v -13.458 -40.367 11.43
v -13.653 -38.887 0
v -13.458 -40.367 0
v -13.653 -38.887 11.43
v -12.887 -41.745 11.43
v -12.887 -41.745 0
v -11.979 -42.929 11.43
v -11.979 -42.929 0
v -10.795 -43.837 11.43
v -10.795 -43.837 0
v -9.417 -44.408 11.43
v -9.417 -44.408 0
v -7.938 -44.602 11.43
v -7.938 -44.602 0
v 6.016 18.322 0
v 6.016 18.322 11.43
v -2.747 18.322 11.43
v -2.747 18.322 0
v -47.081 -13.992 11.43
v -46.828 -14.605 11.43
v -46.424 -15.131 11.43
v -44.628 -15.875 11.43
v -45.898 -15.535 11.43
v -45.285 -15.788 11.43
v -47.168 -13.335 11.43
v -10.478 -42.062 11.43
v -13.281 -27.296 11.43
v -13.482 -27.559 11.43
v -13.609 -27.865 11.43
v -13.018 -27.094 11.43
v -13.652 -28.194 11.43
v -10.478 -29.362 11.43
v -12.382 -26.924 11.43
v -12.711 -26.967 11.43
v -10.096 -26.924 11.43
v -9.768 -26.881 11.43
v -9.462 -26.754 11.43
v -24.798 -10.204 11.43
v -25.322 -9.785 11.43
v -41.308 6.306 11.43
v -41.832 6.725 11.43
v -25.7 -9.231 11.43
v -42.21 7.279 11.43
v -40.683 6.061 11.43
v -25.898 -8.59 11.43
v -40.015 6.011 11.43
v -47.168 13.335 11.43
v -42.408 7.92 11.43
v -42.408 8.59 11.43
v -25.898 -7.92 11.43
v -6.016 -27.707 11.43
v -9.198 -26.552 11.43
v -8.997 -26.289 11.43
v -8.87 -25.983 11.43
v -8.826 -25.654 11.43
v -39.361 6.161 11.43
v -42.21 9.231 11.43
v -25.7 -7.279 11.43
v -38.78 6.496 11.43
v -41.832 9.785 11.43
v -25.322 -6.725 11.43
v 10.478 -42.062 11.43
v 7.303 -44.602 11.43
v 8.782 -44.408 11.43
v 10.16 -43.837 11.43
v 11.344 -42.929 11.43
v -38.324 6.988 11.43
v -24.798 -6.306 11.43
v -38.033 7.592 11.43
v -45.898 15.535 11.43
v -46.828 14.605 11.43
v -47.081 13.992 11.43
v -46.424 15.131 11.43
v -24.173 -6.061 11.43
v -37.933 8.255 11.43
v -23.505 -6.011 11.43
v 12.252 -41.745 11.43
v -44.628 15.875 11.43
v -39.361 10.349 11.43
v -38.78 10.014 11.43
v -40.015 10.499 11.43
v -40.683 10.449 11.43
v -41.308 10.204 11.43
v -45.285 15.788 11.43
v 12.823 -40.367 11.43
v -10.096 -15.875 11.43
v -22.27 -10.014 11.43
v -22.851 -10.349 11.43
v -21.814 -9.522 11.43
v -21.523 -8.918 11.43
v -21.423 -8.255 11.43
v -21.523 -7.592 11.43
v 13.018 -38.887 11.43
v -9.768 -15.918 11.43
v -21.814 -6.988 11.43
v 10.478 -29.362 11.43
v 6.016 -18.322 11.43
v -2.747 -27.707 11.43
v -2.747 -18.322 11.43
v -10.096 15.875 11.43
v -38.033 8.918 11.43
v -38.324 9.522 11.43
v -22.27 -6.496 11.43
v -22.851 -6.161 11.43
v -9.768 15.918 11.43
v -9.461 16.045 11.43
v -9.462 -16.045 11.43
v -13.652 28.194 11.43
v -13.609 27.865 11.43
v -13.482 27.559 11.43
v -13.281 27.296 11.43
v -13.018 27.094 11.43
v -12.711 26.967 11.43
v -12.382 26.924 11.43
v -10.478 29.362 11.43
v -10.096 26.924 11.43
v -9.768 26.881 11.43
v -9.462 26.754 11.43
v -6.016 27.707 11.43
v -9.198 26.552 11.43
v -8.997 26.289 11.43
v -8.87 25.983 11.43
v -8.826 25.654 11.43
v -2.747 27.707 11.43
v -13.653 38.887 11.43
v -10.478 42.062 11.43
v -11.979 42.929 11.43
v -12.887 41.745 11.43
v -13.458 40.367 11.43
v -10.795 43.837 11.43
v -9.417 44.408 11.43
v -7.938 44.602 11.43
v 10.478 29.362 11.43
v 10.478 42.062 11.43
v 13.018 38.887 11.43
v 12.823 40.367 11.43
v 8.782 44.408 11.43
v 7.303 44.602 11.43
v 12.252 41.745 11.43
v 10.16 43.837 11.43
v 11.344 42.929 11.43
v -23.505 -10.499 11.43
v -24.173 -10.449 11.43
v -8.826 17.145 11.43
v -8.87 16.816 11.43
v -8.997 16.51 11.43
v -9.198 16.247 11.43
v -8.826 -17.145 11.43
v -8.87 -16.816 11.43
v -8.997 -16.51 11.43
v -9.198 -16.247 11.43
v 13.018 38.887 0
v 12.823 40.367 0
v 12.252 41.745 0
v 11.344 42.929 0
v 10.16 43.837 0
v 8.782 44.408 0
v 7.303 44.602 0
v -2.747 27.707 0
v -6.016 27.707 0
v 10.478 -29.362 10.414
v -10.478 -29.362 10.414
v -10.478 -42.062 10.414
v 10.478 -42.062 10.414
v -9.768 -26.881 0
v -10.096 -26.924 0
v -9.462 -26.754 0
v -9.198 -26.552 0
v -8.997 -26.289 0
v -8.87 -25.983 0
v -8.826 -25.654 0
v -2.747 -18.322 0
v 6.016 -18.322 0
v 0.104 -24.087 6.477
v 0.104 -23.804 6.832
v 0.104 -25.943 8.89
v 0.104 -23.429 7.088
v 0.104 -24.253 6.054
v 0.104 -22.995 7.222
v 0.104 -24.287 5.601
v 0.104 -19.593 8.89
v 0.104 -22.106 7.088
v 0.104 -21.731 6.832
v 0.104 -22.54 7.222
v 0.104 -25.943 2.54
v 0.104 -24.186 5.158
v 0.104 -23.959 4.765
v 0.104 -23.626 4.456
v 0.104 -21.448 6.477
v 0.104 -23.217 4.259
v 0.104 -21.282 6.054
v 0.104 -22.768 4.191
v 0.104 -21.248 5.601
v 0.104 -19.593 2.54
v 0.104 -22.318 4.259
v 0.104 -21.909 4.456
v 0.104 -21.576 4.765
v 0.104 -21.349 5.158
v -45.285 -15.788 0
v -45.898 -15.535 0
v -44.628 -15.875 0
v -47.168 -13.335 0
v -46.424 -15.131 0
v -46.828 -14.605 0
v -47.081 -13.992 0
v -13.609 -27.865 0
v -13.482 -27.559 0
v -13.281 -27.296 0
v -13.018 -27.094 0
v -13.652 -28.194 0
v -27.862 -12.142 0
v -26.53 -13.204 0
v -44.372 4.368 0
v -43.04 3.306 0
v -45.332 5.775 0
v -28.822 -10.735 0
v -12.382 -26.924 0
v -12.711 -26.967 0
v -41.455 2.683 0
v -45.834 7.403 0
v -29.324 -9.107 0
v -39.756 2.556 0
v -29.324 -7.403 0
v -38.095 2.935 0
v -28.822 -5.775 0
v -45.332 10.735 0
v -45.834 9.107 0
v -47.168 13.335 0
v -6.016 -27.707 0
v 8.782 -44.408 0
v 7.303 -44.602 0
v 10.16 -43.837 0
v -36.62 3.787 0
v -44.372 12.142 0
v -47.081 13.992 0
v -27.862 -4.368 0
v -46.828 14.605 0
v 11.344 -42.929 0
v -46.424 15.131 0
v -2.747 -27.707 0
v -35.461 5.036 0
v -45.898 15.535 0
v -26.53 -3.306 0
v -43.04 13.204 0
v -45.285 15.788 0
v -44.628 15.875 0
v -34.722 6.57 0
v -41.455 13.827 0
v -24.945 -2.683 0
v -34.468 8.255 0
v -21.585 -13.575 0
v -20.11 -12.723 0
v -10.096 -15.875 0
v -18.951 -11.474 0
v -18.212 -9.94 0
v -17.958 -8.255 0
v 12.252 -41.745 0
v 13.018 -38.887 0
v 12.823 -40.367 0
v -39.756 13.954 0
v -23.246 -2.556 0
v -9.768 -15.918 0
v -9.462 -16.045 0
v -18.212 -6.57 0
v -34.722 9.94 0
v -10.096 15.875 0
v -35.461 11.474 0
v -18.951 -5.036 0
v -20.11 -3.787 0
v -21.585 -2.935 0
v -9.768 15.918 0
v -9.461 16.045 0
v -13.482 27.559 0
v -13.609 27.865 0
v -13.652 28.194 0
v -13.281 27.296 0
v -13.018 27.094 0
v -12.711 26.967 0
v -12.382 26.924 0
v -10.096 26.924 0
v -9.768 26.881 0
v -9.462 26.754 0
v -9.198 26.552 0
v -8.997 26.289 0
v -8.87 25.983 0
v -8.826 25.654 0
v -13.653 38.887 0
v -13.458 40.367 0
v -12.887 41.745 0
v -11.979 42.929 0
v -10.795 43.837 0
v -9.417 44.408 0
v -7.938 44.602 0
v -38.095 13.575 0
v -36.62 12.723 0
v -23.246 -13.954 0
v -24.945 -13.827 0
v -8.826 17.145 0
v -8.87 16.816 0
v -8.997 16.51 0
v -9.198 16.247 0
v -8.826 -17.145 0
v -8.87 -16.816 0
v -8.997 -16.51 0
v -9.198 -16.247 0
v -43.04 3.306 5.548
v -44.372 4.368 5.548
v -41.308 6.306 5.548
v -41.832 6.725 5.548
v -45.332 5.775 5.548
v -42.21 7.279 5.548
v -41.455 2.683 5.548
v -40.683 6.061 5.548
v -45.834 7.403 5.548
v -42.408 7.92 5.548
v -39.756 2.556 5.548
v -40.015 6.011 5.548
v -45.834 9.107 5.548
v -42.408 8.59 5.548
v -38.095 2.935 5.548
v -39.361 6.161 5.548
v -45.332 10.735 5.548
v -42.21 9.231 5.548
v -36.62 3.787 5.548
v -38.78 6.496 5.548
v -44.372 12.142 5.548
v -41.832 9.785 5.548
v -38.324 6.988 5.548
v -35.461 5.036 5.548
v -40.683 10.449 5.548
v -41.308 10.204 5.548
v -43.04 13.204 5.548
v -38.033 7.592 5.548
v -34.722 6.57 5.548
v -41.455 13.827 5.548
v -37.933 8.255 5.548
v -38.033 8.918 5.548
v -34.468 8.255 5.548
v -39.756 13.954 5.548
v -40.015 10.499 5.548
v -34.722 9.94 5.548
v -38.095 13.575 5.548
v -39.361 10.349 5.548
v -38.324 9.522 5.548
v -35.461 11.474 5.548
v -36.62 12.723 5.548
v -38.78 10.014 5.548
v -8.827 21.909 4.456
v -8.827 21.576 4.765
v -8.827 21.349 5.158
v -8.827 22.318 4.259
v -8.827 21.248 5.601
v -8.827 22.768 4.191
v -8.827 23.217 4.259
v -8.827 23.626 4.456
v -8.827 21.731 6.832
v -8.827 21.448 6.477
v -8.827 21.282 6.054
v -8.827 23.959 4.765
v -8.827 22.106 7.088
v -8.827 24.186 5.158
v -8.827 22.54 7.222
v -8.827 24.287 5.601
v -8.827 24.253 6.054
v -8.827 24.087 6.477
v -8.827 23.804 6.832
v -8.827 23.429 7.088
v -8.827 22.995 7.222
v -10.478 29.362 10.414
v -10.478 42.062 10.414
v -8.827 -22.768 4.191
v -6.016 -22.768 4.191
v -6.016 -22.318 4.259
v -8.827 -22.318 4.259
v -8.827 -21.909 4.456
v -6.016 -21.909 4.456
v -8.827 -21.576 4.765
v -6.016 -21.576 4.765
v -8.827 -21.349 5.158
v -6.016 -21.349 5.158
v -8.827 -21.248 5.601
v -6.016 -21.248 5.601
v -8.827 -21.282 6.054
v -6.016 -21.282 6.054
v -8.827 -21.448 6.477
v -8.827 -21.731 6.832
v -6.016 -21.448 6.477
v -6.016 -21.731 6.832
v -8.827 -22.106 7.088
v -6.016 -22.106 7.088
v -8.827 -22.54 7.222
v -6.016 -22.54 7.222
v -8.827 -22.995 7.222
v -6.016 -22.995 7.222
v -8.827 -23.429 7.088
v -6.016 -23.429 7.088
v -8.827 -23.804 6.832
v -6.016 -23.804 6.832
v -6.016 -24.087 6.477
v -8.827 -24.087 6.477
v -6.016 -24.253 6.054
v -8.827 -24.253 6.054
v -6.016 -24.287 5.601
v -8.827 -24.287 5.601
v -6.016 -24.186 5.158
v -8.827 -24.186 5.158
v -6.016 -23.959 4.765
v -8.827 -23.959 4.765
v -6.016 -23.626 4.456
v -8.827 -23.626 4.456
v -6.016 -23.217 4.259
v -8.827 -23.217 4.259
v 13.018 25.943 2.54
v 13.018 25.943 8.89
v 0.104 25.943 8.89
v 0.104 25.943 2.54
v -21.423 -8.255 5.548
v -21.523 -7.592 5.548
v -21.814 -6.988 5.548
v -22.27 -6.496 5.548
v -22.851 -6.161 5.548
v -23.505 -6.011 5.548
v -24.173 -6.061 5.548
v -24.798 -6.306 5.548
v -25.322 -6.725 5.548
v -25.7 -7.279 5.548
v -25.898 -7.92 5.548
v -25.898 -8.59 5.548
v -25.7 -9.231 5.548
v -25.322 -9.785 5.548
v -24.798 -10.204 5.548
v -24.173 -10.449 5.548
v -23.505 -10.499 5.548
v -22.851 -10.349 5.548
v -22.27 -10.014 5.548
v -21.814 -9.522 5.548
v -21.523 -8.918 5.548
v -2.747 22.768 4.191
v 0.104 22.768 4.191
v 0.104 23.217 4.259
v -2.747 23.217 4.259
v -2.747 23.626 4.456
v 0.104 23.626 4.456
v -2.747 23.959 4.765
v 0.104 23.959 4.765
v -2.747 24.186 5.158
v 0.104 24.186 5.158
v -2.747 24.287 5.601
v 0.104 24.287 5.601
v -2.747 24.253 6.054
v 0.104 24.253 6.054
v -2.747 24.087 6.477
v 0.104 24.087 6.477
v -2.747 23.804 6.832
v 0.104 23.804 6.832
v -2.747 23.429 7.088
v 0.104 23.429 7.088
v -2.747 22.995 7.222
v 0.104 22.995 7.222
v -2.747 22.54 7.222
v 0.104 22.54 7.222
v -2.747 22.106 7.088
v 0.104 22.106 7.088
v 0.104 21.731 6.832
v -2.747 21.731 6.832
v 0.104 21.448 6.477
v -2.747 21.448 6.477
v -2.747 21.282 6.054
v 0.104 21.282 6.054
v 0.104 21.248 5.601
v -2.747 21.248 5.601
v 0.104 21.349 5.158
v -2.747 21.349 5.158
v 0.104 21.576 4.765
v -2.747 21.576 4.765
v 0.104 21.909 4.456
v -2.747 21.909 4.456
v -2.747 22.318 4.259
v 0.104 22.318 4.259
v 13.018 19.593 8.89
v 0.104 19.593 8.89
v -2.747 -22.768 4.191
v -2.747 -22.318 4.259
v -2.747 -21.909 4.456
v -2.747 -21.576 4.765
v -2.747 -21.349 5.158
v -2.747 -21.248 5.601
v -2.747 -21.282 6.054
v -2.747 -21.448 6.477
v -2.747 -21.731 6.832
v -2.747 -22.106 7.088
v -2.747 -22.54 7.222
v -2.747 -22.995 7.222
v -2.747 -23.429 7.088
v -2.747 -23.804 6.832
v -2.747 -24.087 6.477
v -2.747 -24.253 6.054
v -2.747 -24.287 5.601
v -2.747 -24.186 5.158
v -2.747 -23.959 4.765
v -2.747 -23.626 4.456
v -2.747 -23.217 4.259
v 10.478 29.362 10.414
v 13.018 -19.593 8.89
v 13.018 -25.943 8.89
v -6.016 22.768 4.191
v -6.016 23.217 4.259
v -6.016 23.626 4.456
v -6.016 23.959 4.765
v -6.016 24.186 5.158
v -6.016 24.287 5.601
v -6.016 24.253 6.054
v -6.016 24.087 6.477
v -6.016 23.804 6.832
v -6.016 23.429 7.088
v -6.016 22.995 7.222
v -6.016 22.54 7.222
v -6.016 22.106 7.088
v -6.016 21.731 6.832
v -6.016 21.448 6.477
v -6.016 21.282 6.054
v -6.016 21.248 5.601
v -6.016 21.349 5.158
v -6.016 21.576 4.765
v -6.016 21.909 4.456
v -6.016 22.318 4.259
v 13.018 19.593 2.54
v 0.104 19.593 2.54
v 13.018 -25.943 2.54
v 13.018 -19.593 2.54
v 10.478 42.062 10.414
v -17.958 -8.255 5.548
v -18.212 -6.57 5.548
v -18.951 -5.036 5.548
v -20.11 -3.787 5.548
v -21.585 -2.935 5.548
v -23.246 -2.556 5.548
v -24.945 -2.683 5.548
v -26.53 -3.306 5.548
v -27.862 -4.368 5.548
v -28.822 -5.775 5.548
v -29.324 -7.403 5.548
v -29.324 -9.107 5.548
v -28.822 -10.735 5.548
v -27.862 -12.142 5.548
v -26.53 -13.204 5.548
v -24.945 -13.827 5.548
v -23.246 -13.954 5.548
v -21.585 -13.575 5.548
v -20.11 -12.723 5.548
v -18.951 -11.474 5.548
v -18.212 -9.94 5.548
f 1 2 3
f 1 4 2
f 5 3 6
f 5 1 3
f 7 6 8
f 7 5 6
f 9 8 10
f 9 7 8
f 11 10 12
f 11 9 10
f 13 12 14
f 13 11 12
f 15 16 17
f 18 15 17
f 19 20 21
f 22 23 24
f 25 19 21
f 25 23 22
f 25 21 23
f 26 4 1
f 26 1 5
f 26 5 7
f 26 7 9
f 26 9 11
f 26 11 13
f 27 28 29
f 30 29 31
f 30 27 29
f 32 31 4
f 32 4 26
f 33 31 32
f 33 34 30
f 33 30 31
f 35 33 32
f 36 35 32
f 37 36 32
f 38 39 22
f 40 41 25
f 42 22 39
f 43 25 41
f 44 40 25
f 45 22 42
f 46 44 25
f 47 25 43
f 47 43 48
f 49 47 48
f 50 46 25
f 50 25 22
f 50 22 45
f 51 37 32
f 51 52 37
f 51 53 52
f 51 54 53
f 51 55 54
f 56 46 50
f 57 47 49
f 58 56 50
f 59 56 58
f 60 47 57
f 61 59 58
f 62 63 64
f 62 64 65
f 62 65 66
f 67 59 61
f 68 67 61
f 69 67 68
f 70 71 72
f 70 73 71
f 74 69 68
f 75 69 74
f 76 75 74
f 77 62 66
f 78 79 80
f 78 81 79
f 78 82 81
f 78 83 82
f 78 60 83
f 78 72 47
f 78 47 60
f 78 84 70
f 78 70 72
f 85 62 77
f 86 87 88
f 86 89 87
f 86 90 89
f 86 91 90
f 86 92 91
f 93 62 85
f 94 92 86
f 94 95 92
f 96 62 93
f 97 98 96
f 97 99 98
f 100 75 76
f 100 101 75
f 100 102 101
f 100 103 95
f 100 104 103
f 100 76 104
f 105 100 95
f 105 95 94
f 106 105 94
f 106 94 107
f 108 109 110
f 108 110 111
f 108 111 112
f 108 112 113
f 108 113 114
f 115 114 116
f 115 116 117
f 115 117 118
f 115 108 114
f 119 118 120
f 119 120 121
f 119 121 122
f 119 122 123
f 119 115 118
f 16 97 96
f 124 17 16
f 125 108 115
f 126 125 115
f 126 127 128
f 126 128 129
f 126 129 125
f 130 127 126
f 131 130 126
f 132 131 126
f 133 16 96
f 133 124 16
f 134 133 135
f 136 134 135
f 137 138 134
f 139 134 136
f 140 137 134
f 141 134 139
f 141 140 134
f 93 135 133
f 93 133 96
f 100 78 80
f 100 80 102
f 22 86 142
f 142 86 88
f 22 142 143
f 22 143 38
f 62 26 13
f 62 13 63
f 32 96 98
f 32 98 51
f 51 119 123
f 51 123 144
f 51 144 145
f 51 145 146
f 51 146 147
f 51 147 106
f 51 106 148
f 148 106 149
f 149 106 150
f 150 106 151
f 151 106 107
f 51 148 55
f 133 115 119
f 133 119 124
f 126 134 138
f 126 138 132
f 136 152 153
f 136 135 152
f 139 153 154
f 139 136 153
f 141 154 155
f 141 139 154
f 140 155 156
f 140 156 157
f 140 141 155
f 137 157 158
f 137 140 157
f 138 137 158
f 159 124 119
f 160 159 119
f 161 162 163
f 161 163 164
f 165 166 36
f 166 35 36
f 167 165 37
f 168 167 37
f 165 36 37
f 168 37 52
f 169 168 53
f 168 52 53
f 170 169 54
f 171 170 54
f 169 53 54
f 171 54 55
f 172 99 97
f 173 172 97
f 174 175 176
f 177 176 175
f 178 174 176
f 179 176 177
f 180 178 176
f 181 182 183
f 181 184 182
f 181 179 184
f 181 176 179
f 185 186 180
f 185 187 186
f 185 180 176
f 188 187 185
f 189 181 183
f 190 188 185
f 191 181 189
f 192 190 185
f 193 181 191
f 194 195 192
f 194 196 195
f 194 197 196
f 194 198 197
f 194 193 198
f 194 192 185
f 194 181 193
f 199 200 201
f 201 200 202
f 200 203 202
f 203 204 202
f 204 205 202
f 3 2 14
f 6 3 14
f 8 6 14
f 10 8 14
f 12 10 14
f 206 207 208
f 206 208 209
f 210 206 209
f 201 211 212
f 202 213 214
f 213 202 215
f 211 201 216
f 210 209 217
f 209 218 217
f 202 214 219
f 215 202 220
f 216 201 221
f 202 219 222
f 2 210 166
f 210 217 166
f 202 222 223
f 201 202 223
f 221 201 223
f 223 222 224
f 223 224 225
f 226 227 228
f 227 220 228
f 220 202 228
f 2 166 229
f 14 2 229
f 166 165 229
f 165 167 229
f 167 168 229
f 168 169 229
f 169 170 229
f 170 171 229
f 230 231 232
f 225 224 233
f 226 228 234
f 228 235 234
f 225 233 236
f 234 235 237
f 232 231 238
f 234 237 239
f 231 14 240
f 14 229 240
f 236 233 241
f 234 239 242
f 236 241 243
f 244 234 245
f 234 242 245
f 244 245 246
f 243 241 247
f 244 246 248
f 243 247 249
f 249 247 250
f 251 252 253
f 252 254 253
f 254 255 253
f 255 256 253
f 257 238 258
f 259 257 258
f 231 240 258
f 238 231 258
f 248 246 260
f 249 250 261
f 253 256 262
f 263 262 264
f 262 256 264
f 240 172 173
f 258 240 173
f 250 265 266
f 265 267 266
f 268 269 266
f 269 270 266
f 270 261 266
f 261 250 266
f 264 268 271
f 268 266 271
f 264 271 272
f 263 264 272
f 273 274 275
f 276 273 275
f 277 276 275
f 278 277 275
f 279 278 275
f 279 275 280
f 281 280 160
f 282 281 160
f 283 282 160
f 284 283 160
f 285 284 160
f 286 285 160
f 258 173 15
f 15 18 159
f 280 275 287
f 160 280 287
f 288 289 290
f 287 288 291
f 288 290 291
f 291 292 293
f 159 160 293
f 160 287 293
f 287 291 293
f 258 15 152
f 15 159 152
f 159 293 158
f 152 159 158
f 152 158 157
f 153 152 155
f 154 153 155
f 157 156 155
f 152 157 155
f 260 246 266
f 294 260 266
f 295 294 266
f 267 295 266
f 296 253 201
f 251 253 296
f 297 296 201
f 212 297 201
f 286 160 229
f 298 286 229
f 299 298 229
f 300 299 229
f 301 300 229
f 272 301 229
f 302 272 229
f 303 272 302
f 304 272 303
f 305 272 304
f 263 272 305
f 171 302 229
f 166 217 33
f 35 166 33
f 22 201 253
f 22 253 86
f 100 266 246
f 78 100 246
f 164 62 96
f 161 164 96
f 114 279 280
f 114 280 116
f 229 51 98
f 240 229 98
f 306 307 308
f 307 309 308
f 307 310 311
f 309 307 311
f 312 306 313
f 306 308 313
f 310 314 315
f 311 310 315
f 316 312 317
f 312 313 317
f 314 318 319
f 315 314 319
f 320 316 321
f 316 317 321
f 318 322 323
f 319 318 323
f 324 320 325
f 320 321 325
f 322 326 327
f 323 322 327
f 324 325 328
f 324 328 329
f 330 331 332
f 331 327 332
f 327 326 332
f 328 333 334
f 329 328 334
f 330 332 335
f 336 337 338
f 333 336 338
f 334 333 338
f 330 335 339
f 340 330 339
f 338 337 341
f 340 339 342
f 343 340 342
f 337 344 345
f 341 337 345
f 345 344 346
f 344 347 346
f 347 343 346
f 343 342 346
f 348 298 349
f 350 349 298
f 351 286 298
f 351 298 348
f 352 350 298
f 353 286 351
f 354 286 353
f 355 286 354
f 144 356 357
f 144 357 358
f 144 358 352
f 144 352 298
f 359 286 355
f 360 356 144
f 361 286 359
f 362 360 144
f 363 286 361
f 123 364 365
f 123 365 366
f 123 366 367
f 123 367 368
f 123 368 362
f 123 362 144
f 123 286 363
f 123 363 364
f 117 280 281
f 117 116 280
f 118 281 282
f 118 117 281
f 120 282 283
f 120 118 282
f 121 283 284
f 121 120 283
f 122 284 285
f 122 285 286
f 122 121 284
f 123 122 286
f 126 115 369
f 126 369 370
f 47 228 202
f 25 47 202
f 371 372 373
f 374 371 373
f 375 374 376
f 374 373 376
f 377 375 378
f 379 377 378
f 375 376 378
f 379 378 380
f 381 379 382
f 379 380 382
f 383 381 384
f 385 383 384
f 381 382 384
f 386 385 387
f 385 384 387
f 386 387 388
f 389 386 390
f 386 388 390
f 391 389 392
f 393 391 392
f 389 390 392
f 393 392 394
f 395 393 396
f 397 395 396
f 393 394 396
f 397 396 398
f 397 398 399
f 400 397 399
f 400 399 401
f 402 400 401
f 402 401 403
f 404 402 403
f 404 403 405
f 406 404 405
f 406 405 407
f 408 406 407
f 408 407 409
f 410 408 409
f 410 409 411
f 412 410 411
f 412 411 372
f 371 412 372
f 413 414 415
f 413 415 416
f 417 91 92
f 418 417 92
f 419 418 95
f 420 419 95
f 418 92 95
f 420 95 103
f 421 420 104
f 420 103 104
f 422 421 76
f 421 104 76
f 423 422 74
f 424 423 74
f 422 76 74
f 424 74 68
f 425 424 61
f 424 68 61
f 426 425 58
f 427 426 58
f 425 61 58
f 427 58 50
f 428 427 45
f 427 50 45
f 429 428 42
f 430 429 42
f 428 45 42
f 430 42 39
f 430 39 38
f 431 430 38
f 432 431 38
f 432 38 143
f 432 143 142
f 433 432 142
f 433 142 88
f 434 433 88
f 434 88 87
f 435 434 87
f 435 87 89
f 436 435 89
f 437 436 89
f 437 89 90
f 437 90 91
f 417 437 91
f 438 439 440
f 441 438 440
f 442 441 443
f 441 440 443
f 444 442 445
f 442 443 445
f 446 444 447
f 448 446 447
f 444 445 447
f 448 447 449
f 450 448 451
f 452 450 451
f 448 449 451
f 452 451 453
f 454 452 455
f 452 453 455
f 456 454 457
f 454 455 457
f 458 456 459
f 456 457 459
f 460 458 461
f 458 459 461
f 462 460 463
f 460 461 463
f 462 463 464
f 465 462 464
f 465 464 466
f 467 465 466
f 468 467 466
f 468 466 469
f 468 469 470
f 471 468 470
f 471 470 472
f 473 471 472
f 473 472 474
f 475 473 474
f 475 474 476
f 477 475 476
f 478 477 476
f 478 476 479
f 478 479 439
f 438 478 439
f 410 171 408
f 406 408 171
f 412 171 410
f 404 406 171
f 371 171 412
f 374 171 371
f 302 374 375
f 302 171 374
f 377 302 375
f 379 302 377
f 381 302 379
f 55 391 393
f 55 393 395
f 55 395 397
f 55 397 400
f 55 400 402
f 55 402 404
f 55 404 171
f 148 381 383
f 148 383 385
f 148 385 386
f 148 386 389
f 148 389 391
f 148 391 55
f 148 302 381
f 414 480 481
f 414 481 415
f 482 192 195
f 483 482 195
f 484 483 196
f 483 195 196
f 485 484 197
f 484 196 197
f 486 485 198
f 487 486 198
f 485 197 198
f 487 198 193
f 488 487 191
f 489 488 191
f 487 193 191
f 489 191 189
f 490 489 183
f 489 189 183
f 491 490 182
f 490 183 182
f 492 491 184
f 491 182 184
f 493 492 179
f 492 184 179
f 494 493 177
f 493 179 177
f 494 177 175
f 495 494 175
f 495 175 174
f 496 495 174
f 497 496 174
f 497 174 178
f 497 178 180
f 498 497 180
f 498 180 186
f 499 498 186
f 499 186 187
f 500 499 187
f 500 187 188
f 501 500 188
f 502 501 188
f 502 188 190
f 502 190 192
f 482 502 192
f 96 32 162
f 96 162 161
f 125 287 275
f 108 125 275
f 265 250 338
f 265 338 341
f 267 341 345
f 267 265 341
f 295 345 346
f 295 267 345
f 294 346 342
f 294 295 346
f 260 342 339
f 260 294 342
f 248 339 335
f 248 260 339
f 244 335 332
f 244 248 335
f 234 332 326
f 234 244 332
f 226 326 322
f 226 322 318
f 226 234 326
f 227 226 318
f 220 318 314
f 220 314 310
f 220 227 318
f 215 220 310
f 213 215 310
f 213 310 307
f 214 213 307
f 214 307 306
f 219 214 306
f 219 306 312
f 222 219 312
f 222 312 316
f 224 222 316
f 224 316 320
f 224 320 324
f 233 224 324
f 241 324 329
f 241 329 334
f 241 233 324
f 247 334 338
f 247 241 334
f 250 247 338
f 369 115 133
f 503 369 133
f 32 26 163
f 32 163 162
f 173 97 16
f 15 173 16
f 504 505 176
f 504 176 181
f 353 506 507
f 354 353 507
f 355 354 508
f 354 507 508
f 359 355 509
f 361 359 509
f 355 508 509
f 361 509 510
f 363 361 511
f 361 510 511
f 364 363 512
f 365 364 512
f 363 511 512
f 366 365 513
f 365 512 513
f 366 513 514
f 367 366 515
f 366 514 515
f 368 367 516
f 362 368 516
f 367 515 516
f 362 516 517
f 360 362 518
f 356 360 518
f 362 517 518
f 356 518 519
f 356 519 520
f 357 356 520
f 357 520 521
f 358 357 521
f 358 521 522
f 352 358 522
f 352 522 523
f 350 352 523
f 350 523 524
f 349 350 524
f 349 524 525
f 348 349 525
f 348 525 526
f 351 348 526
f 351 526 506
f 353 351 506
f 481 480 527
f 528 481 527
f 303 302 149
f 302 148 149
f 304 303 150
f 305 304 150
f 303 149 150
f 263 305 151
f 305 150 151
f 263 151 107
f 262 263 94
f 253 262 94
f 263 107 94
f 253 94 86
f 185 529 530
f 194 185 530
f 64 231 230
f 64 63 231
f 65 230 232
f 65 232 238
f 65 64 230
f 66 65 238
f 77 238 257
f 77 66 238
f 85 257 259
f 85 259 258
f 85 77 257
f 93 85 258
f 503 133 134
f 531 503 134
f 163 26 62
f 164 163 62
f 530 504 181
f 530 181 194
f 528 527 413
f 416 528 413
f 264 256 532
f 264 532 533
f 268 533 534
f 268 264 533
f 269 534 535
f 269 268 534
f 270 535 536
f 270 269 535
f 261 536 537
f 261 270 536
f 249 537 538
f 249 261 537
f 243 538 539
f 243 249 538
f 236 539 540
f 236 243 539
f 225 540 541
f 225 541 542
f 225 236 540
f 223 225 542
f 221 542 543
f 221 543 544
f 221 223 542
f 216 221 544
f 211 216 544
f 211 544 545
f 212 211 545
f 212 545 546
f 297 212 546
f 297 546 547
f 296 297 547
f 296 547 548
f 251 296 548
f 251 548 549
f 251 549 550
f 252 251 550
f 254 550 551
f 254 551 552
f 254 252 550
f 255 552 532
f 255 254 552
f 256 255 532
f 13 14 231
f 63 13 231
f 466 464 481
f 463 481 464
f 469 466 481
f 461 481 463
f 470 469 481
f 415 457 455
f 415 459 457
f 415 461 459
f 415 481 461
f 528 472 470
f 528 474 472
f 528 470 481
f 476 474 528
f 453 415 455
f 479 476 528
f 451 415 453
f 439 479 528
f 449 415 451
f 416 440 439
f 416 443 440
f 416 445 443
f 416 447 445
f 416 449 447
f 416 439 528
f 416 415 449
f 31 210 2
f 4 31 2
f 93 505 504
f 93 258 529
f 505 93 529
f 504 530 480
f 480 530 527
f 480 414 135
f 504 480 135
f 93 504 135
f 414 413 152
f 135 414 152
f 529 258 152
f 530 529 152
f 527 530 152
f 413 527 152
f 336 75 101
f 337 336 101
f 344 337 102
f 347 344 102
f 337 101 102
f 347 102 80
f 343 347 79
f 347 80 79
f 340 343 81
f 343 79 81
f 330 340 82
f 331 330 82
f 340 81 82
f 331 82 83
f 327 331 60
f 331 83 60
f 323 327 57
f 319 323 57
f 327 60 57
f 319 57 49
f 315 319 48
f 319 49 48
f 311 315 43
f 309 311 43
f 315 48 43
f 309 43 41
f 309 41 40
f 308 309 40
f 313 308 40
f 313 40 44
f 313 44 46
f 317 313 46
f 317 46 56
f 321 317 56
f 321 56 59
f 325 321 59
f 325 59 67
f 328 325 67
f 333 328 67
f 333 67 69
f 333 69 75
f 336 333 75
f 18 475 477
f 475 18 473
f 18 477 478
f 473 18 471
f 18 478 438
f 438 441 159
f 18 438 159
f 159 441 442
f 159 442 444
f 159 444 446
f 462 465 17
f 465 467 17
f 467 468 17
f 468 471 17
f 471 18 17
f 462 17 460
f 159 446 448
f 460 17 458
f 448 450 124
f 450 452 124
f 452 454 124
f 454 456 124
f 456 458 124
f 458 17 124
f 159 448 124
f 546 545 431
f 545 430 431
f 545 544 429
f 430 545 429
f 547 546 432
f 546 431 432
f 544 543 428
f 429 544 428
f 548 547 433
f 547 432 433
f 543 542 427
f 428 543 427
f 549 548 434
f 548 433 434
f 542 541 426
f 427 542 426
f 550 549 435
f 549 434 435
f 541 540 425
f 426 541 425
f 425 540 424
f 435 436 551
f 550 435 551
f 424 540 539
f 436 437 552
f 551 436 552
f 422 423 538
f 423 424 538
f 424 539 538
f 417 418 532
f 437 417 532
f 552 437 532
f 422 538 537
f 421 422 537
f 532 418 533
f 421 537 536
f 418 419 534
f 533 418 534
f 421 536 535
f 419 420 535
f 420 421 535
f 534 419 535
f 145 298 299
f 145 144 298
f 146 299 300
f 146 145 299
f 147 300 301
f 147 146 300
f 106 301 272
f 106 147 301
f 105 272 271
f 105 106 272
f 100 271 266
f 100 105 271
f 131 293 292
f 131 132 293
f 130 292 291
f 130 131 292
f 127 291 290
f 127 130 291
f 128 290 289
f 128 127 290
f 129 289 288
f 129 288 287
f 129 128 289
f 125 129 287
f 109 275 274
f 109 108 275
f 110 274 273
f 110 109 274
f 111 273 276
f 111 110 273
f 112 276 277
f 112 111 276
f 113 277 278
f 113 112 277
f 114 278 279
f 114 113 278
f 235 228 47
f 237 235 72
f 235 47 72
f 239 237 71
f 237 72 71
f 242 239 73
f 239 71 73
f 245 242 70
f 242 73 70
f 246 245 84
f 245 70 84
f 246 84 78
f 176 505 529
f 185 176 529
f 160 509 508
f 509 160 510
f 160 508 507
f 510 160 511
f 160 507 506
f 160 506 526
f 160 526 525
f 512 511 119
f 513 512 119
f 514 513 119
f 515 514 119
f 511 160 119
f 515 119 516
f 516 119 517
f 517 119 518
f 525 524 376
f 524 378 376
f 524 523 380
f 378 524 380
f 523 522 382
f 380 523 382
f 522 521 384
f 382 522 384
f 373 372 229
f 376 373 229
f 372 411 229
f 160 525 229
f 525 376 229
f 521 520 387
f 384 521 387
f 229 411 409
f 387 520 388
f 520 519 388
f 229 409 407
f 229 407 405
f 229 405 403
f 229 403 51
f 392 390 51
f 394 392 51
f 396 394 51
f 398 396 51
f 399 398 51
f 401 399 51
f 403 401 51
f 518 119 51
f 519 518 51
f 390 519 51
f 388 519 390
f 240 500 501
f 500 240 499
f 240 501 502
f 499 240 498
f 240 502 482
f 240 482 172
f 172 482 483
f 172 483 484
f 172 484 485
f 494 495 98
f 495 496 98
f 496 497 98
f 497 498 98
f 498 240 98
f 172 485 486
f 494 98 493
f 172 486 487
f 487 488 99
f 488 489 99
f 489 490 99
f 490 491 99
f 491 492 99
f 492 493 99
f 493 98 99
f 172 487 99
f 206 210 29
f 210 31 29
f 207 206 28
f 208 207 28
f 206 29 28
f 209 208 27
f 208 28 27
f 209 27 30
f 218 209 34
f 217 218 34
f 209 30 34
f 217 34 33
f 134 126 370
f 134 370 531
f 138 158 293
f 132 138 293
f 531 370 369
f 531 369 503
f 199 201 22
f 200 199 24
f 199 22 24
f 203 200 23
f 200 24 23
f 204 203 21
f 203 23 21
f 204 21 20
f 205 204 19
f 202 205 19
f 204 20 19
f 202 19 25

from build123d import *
from OCP.BRepAlgoAPI import BRepAlgoAPI_Cut
from OCP.TopTools import TopTools_ListOfShape

# Parameters (mm, degrees)
BOSS_EXTRUDE2_DEPTH = 11.43
SKETCH4_W           = 20.955
SKETCH4_H           = 12.7
CUT_EXTRUDE2_DEPTH  = 1.016
SKETCH5_R           = 2.25
CUT_EXTRUDE3_DEPTH  = 66.915251214
SKETCH6_R           = 1.524
CUT_EXTRUDE4_DEPTH  = 76.777894678
SKETCH7_W           = 11.43
SKETCH7_H           = 11.049
CUT_EXTRUDE5_DEPTH  = 4.826
SKETCH8_W           = 6.35
SKETCH8_H           = 6.35
CUT_EXTRUDE6_DEPTH  = 12.914
SKETCH9_R           = 5.715
CUT_EXTRUDE7_DEPTH  = 5.548
CUT_EXTRUDE8_DEPTH  = 66.915251214
FILLET1_R           = 1.27
FILLET2_R           = 2.54
FILLET3_R           = 5.715


with BuildPart() as part:
    # Sketch1 → Boss-Extrude2 (new body)
    with BuildSketch(Plane.XY):
        Polygon((13.0175, 0), (13.0175, 44.6024), (-13.6525, 44.6024), (-13.6525, 15.875), (-47.1678, 15.875), (-47.1678, 0), (-47.1678, -15.875), (-13.6525, -15.875), (-13.6525, -44.6024), (13.0175, -44.6024), align=None)
        Polygon((-5.7658, 27.4574), (-5.7658, -27.4574), (-2.997199182, -27.4574), (-2.997199182, -18.0721), (5.7658, -18.0721), (5.7658, 18.0721), (-2.997199182, 18.0721), (-2.997199182, 27.4574), align=None, mode=Mode.SUBTRACT)
    extrude(amount=BOSS_EXTRUDE2_DEPTH)

    # Sketch4 → Cut-Extrude2 (cut)
    with BuildSketch(Plane.XY.offset(11.43)):
        with Locations((0, 35.7124)):
            Rectangle(SKETCH4_W, SKETCH4_H)
        with Locations((0, -35.7124)):
            Rectangle(SKETCH4_W, SKETCH4_H)
    extrude(amount=-CUT_EXTRUDE2_DEPTH, mode=Mode.SUBTRACT)

    # Sketch5 → Cut-Extrude3 (cut, through all)
    with BuildSketch(Plane.XY.offset(11.43)):
        with Locations((-40.1828, 8.255)):
            Circle(SKETCH5_R)
        with Locations((-23.6728, -8.255)):
            Circle(SKETCH5_R)
    extrude(amount=-CUT_EXTRUDE3_DEPTH, mode=Mode.SUBTRACT)

    # Sketch6 → Cut-Extrude4 (cut, through all)
    with BuildSketch(Plane(origin=(13.0175, 0, 0), x_dir=(0, 0, -1), z_dir=(1, 0, 0))):
        with Locations((-5.715, 22.767528581)):
            Circle(SKETCH6_R)
        with Locations((-5.715, -22.767528581)):
            Circle(SKETCH6_R)
    extrude(amount=-CUT_EXTRUDE4_DEPTH, mode=Mode.SUBTRACT)

    # Sketch7 → Cut-Extrude5 (cut)
    with BuildSketch(Plane.ZY.offset(13.6525)):
        with Locations((5.715, 21.3995)):
            Rectangle(SKETCH7_W, SKETCH7_H)
        with Locations((5.715, -21.3995)):
            Rectangle(SKETCH7_W, SKETCH7_H)
    extrude(amount=-CUT_EXTRUDE5_DEPTH, mode=Mode.SUBTRACT)

    # Sketch8 → Cut-Extrude6 (cut)
    with BuildSketch(Plane(origin=(13.0175, 0, 0), x_dir=(0, 0, -1), z_dir=(1, 0, 0))):
        with Locations((-5.715, -22.767528581)):
            Rectangle(SKETCH8_W, SKETCH8_H)
        with Locations((-5.715, 22.767528581)):
            Rectangle(SKETCH8_W, SKETCH8_H)
    extrude(amount=-CUT_EXTRUDE6_DEPTH, mode=Mode.SUBTRACT)

    # Sketch9 → Cut-Extrude7 (cut)
    with BuildSketch(Plane.XY):
        with Locations((-40.1828, 8.255)):
            Circle(SKETCH9_R)
        with Locations((-23.6728, -8.255)):
            Circle(SKETCH9_R)
    extrude(amount=CUT_EXTRUDE7_DEPTH, mode=Mode.SUBTRACT)


with BuildPart() as cut_extrude8_tool:
    # Sketch10 → Cut-Extrude8 (new, through all)
    with BuildSketch(Plane.XY.offset(11.43)):
        Polygon((-2.747199182, 27.7074), (-6.015799182, 27.7074), (-6.015799182, -27.7074), (-2.747199182, -27.7074), (-2.747199182, -18.3221), (6.015800818, -18.3221), (6.015800818, 18.3221), (-2.747199182, 18.3221), align=None)
        Polygon((-2.997199182, 27.4574), (-5.765799182, 27.4574), (-5.765799182, -27.4574), (-2.997199182, -27.4574), (-2.997199182, -18.0721), (5.7658, -18.0721), (5.765800818, 18.0721), (-2.997199182, 18.0721), align=None, mode=Mode.SUBTRACT)
    extrude(amount=-CUT_EXTRUDE8_DEPTH)


with BuildPart() as part_1:
    add(part.part)

    # Cut-Extrude8: cut by cut_extrude8_tool, with a tolerance
    cut_extrude8_stock = TopTools_ListOfShape()
    cut_extrude8_stock.Append(part_1.part.wrapped)
    cut_extrude8_tools = TopTools_ListOfShape()
    cut_extrude8_tools.Append(cut_extrude8_tool.part.wrapped)
    cut_extrude8_cut = BRepAlgoAPI_Cut()
    cut_extrude8_cut.SetArguments(cut_extrude8_stock)
    cut_extrude8_cut.SetTools(cut_extrude8_tools)
    cut_extrude8_cut.SetFuzzyValue(0.00001)
    cut_extrude8_cut.Build()
    add(Compound.cast(cut_extrude8_cut.Shape()).solids(), mode=Mode.REPLACE)

    # Fillet1
    fillet1_edges = [part_1.edges().sort_by_distance(p)[0] for p in [
        (-13.6525, 26.924, 5.715),
        (-13.6525, -26.924, 5.715),
        (-8.8265, -26.924, 5.715),
        (-8.8265, -15.875, 5.715),
        (-8.8265, 15.875, 5.715),
        (-8.8265, 26.924, 5.715),
    ]]
    fillet(fillet1_edges, radius=FILLET1_R)

    # Fillet2
    fillet2_edges = [part_1.edges().sort_by_distance(p)[0] for p in [
        (-47.1678, -15.875, 5.715),
        (-47.1678, 15.875, 5.715),
    ]]
    fillet(fillet2_edges, radius=FILLET2_R)

    # Fillet3
    fillet3_edges = [part_1.edges().sort_by_distance(p)[0] for p in [
        (-13.6525, -44.6024, 5.715),
        (13.0175, -44.6024, 5.715),
        (13.0175, 44.6024, 5.715),
        (-13.6525, 44.6024, 5.715),
    ]]
    fillet(fillet3_edges, radius=FILLET3_R)


solid = part_1.part
